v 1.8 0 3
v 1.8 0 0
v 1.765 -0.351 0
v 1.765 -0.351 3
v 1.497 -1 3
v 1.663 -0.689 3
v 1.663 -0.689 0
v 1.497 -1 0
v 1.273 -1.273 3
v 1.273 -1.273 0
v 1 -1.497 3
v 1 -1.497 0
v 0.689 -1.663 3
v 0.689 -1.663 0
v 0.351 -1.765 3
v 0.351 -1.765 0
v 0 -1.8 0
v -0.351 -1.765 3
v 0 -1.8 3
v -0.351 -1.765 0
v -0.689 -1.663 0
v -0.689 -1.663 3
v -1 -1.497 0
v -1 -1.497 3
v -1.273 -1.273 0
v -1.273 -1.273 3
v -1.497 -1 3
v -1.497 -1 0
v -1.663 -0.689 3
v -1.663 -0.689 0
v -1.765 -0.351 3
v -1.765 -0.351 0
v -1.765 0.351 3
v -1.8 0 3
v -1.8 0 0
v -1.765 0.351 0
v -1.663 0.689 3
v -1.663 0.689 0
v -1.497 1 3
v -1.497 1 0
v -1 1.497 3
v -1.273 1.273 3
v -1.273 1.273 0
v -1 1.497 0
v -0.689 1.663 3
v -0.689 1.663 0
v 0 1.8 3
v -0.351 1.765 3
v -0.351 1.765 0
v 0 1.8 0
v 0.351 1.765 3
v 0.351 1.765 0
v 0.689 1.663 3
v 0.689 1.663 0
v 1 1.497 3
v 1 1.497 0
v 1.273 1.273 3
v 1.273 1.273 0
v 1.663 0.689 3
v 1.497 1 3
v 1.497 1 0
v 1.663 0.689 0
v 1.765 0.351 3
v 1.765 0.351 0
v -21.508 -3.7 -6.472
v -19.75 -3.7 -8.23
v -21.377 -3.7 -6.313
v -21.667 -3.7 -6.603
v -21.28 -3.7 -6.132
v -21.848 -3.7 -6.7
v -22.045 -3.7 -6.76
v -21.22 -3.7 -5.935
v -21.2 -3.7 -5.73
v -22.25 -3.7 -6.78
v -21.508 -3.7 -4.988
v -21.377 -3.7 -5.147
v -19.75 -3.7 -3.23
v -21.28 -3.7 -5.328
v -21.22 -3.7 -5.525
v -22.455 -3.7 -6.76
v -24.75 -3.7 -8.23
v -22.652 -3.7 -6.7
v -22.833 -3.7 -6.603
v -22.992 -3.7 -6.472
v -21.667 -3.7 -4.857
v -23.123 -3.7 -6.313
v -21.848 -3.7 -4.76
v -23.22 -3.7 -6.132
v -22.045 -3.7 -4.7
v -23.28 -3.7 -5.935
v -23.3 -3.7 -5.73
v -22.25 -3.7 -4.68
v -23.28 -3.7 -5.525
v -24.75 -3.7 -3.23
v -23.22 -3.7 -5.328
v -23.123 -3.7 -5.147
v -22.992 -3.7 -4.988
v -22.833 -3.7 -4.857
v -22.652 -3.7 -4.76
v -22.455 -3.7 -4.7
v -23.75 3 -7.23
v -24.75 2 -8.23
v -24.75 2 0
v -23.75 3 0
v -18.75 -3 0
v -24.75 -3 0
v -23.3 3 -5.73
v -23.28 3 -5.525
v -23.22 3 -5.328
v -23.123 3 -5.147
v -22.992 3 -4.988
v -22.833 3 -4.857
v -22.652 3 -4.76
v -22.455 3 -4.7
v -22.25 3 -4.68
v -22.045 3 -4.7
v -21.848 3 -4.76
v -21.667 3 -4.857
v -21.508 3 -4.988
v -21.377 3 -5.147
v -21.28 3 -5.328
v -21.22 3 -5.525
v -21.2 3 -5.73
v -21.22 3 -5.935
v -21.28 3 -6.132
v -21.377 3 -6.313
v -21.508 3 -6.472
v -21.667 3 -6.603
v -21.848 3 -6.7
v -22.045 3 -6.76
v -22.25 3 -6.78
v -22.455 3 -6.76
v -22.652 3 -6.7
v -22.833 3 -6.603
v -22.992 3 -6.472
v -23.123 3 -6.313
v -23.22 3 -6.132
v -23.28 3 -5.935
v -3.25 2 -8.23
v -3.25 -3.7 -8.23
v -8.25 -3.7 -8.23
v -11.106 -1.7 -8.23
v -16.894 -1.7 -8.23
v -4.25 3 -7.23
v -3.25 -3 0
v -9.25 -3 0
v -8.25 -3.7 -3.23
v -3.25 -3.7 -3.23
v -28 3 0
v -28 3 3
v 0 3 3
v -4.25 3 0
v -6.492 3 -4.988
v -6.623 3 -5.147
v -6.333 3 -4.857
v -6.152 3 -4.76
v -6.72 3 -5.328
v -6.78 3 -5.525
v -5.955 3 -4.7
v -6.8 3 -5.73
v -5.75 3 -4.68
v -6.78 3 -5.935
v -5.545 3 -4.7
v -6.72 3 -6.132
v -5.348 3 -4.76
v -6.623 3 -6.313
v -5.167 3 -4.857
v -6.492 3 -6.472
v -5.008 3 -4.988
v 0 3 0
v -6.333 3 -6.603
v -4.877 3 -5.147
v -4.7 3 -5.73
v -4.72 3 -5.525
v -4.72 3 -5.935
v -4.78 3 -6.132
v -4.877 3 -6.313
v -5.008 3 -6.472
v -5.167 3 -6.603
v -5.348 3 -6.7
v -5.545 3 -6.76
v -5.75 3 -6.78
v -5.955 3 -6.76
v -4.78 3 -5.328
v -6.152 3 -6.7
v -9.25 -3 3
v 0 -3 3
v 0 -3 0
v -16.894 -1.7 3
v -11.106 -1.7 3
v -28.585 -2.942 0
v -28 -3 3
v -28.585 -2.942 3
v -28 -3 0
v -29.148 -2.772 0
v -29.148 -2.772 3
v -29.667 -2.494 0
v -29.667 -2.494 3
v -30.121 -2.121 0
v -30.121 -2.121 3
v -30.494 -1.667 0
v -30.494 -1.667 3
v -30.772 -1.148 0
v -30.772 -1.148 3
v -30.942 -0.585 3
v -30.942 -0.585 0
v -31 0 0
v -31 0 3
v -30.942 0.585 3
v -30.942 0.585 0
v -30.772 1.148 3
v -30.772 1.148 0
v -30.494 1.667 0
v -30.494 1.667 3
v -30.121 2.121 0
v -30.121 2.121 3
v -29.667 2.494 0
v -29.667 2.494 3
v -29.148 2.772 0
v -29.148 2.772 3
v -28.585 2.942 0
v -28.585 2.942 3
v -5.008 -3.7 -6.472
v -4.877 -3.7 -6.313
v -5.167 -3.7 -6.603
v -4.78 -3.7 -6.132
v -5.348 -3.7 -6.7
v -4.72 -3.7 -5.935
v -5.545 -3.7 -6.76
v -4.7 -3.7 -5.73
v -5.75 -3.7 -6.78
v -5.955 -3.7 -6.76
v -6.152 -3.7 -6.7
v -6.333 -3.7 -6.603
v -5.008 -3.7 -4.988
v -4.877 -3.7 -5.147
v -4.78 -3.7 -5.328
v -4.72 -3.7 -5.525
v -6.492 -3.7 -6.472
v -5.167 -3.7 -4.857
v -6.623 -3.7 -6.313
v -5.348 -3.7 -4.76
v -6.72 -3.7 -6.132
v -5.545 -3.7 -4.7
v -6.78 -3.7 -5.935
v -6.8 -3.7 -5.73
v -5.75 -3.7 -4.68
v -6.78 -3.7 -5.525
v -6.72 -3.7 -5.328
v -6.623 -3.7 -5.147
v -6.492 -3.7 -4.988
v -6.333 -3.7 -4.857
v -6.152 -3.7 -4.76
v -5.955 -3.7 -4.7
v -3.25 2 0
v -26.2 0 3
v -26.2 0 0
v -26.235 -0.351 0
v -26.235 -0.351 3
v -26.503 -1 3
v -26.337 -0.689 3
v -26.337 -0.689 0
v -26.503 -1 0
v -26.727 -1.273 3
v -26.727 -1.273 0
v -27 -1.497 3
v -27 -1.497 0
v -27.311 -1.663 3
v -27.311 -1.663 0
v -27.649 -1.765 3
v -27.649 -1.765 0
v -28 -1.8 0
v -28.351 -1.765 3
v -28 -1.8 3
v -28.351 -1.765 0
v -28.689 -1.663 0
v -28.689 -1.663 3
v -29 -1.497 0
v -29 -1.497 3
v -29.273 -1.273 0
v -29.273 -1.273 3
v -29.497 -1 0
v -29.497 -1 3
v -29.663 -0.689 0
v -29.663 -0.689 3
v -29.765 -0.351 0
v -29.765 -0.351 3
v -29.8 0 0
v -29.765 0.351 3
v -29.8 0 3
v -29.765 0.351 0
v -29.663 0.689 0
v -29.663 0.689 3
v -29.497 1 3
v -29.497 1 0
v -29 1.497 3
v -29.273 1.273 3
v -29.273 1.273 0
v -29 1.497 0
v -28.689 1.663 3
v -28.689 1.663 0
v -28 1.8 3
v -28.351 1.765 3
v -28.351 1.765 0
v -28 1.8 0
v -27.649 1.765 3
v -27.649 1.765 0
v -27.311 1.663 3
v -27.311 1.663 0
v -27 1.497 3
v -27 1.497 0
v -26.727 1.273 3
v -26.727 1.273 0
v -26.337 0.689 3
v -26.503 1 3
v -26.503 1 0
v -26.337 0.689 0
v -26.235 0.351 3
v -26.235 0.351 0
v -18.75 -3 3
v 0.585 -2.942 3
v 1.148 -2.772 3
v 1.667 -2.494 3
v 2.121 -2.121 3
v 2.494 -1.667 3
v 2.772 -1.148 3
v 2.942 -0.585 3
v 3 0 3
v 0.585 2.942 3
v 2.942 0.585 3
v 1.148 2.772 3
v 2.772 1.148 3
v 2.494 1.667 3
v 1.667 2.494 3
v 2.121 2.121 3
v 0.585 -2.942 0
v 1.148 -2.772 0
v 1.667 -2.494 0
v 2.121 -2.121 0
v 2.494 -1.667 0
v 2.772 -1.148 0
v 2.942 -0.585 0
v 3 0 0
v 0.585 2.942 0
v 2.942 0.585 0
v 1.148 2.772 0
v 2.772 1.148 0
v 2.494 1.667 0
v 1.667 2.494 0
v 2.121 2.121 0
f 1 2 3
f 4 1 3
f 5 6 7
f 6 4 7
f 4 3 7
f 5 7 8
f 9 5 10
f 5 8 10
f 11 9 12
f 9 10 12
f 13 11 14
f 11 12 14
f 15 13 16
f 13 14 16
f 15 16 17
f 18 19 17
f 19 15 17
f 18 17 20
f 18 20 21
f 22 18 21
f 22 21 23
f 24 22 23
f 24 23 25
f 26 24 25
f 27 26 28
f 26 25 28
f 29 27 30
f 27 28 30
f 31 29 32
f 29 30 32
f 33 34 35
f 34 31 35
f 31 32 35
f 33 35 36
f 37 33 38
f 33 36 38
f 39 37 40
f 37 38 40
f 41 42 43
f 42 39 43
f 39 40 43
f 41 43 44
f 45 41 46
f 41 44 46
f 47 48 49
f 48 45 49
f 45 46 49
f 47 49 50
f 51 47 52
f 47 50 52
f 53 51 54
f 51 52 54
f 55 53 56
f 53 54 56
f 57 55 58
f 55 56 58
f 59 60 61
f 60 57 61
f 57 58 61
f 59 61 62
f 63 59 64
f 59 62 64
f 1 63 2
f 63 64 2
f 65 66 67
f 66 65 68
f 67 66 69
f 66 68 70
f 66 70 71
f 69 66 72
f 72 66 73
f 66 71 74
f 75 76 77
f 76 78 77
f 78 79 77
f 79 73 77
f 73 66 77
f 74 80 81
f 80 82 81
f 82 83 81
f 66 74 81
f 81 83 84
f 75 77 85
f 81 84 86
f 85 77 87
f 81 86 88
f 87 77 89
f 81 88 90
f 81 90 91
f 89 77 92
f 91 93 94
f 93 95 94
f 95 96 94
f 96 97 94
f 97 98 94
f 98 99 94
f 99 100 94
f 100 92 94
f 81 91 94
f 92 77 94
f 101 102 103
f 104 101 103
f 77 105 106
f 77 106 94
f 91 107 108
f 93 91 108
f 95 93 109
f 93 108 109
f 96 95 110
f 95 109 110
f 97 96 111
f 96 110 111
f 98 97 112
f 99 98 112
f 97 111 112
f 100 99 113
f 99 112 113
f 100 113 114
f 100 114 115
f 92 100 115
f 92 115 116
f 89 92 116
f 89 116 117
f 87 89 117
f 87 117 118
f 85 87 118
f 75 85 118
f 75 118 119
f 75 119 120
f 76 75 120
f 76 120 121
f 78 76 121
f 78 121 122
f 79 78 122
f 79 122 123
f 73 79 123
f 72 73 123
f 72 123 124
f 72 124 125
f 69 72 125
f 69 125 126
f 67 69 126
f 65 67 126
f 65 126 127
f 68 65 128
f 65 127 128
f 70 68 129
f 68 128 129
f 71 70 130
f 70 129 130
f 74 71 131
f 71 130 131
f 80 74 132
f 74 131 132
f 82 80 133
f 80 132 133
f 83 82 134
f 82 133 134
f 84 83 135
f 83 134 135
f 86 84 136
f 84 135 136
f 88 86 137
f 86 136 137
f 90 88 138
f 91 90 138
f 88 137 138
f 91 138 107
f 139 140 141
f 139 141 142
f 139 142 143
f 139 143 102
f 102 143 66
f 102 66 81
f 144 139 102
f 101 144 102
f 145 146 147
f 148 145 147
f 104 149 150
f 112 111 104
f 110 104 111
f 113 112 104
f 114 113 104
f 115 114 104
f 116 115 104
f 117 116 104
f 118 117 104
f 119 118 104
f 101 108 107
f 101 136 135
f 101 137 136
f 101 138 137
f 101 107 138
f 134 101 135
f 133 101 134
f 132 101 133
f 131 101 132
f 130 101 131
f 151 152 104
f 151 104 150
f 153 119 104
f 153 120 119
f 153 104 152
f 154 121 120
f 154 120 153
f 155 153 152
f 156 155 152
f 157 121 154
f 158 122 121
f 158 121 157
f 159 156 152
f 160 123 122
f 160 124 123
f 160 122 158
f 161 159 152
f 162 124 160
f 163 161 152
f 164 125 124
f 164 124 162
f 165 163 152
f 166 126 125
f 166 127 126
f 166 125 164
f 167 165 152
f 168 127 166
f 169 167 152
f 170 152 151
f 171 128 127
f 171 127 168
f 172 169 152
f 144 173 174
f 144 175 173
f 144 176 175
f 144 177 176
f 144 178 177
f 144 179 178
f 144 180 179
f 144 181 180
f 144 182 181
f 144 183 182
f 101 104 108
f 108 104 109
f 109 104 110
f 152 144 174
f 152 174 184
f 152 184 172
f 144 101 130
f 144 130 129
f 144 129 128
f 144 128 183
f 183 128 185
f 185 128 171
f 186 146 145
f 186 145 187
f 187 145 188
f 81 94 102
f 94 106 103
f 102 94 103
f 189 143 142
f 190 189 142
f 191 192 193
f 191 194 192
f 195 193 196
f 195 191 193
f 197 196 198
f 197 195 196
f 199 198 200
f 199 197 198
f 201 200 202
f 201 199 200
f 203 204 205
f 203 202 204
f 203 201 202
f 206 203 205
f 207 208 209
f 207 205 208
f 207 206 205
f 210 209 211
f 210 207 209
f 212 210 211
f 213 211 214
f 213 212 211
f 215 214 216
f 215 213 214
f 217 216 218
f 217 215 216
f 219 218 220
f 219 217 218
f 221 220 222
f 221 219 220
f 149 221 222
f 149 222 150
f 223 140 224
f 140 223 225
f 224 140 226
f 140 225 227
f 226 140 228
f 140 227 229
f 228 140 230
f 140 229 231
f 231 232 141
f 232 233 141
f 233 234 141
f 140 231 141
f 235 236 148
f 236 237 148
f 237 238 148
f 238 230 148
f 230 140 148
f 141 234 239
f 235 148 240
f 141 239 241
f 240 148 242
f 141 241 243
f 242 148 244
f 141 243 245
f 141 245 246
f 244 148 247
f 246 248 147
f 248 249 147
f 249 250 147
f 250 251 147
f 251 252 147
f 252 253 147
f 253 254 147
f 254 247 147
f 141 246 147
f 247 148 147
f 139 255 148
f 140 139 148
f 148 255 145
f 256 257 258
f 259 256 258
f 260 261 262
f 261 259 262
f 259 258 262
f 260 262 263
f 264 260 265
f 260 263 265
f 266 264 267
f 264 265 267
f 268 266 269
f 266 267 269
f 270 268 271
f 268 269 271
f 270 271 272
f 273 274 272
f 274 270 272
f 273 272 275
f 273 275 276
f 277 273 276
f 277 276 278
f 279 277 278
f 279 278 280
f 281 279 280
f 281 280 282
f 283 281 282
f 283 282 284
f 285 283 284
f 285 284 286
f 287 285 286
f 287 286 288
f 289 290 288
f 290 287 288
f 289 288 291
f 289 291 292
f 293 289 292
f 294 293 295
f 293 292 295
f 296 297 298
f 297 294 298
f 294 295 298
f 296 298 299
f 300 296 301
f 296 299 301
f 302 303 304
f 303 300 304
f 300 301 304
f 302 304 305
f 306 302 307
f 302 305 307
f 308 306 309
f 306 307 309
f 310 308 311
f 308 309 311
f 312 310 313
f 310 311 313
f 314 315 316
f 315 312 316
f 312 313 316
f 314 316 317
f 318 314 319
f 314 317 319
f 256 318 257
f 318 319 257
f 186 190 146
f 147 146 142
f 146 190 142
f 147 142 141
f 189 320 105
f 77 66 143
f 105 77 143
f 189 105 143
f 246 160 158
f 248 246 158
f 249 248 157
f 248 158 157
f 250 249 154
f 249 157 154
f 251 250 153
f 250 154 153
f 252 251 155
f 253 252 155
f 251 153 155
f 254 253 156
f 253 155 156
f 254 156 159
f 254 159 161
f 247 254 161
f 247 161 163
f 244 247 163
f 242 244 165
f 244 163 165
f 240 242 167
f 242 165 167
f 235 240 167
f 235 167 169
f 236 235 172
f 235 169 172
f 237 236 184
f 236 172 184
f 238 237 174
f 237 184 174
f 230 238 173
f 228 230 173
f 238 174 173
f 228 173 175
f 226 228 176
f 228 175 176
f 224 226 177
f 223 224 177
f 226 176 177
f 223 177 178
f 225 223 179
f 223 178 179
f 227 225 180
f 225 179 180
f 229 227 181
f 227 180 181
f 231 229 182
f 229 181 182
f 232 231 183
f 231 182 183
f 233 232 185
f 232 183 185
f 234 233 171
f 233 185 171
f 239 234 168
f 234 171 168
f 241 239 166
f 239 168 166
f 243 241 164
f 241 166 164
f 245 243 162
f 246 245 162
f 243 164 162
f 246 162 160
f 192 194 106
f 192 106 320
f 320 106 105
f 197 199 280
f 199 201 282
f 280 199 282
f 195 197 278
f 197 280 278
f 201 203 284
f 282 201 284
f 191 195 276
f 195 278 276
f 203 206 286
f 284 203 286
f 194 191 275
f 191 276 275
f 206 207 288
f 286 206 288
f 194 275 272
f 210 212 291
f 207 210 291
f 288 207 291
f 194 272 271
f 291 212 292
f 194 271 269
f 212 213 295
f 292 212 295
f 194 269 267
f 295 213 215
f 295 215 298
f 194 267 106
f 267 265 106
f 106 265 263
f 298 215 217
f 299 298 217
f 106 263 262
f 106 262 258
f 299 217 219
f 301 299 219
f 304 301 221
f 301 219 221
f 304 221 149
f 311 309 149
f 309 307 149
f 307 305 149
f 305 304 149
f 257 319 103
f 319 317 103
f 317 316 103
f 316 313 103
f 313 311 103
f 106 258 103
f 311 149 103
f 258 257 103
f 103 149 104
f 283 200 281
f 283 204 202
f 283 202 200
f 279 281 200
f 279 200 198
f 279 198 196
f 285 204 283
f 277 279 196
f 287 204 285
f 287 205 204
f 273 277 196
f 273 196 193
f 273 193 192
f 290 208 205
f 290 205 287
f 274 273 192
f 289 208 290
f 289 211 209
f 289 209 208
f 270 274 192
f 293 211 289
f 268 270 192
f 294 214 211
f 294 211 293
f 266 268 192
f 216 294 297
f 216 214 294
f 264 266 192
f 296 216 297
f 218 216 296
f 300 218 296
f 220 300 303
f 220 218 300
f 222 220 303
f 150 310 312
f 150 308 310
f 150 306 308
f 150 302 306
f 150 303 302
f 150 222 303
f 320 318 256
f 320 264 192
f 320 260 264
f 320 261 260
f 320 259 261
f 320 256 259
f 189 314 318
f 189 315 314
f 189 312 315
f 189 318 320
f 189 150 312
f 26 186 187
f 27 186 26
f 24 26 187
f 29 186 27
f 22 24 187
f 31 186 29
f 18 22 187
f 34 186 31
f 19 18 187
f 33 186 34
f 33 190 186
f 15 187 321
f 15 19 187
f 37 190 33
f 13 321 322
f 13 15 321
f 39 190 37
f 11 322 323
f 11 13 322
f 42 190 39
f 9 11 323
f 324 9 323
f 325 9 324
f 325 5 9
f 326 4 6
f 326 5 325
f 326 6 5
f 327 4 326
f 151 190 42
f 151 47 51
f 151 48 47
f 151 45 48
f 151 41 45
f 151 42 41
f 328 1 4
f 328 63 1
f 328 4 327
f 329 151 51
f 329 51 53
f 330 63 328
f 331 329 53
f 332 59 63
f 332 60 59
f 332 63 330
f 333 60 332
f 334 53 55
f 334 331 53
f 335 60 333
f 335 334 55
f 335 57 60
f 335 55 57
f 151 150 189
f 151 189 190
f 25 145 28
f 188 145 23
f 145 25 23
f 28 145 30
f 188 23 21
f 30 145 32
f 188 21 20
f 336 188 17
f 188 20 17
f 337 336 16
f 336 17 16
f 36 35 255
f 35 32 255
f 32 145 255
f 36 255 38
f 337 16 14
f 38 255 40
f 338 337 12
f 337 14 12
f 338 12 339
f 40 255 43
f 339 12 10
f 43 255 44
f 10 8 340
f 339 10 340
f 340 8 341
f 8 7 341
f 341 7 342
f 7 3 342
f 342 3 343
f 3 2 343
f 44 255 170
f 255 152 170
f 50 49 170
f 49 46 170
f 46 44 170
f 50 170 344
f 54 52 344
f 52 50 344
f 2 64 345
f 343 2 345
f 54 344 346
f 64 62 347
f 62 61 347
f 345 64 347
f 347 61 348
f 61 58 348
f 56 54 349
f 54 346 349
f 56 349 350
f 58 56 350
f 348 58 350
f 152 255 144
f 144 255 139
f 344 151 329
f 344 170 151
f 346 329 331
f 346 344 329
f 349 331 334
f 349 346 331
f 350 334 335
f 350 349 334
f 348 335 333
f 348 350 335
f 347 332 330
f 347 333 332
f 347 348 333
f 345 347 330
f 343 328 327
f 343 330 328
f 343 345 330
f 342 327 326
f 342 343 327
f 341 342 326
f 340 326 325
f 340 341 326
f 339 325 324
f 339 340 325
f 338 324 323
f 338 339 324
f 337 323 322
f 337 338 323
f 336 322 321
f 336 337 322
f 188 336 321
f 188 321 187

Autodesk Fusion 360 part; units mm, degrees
sketch "Skizze1" plane through (0, 0, 0) normal (0, 0, 1) x (1, 0, 0)
  circle A0 centre (0, 0) radius 1.8
  circle A1 centre (-28, 0) radius 1.8
  line L0 (-28, 0) -> (0, 0) construction
  line L1 (-28, 3) -> (0, 3)
  line L2 (-28, -3) -> (0, -3)
  arc A2 (-28, 3) -> (-28, -3) centre (-28, 0) ccw
  arc A3 (0, -3) -> (0, 3) centre (0, 0) ccw
  dimension "d1" = 3.6
  dimension "d2" = 28
  dimension "d3" = 6
extrude "Extrusion1" add sketch "Skizze1" along normal blind 3
sketch "Skizze2" plane through (0, 0, 0) normal (0, 0, 1) x (-1, 0, 0)
  circle A0 centre (0, 0) radius 1.8
  circle A1 centre (28, 0) radius 1.8
  arc A2 (28, -3) -> (28, 3) centre (28, 0) ccw
  line L0 (28, 3) -> (0, 3)
  arc A3 (0, 3) -> (0, -3) centre (0, 0) ccw
  line L1 (0, -3) -> (28, -3)
  line L2 (24.75, -3) -> (3.25, -3)
  line L3 (3.25, -3) -> (3.25, 3.7)
  line L4 (3.25, 3.7) -> (24.75, 3.7)
  line L5 (24.75, 3.7) -> (24.75, -3)
  circle A4 centre (0, 0) radius 1.8
  circle A5 centre (28, 0) radius 1.8
  arc A6 (28, -3) -> (28, 3) centre (28, 0) ccw
  line L6 (28, -3) -> (0, -3)
  arc A7 (0, 3) -> (0, -3) centre (0, 0) ccw
  line L7 (0, 3) -> (28, 3)
  line L8 (28, 0) -> (0, 0) construction
  line L9 (14, 0) -> (14, 18.5057) construction
  dimension "d9" = 0.7
  dimension "d10" = 21.5
extrude "Extrusion2" add sketch "Skizze2" against normal blind 8.23 contours L0 L1 L2 L3 L5 L6 L7 | L0 L3 L4 L5 L7
sketch "Skizze3" plane through (0, 3, 0) normal (0, 1, 0) x (-1, 0, 0)
  line L0 (24.75, 0) -> (28, 0)
  line L1 (28, 0) -> (28, 3)
  line L2 (28, 3) -> (0, 3)
  line L3 (0, 3) -> (0, 0)
  line L4 (0, 0) -> (3.25, 0)
  line L5 (3.25, 0) -> (3.25, -8.23)
  line L6 (3.25, -8.23) -> (24.75, -8.23)
  line L7 (24.75, -8.23) -> (24.75, 0)
  circle A0 centre (22.25, -5.73) radius 1.05
  circle A1 centre (5.75, -5.73) radius 1.05
  line L8 (24.75, -5.73) -> (3.25, -5.73) construction
  dimension "d11" = 2.1
  dimension "d13" = 2.5
  dimension "d14" = 2.5
  dimension "d15" = 2.5
extrude "Extrusion3" cut sketch "Skizze3" against normal up to surface (6.7 mm away) contours A0 | A1
chamfer "Fase1" distance 1 angle 45 3 edges at (-24.75, 3, -4.115) (-14, 3, -8.23) (-3.25, 3, -4.115)
sketch "Skizze4" plane through (-24.75, 0, 0) normal (-1, 0, 0) x (0, -1, 0)
  line L0 (-2, 0) -> (-2, -8.23)
  line L1 (-2, -8.23) -> (3.7, -8.23)
  line L2 (3.7, -8.23) -> (3.7, 0)
  line L3 (3.7, 0) -> (3, 0)
  line L4 (3, 0) -> (-2, 0)
  line L5 (3.7, -4.68) -> (3.7, -6.78)
  line L6 (3.7, -4.68) -> (3.7, -6.78)
  line L7 (3.7, 0) -> (3.7, -8.23)
  line L8 (3.7, -8.23) -> (3.7, 0)
  line L9 (3, 0) -> (3, 3)
  line L10 (3, 3) -> (3, 0)
  line L11 (3, 0) -> (3.7, 0)
  line L12 (3.7, 0) -> (3, 0)
  line L13 (3.7, -3.23) -> (3.7, 0)
  line L14 (3, 0) -> (3.7, -3.23)
  dimension "d29" = 5
extrude "Extrusion4" cut sketch "Skizze4" against normal up to surface (21.5 mm away) contours L2 L3 L7 L8 L11 L12 L13 L14
sketch "Skizze5" plane through (0, 0, -8.23) normal (0, 0, -1) x (1, 0, 0)
  line L0 (-24.75, -2) -> (-3.25, -2)
  line L1 (-3.25, -2) -> (-3.25, 3.7)
  line L2 (-3.25, 3.7) -> (-24.75, 3.7)
  line L3 (-24.75, 3.7) -> (-24.75, -2)
  line L4 (-19.75, 3.7) -> (-16.8937, 1.7)
  line L5 (-16.8937, 1.7) -> (-11.1063, 1.7)
  line L6 (-11.1063, 1.7) -> (-8.25, 3.7)
  line L7 (-14, 3.7) -> (-14, -2) construction
  line L8 (-19.75, 3.7) -> (-8.25, 3.7)
  dimension "d22" = 5
  dimension "d24" = 2
  dimension "d25" = 35
extrude "Extrusion5" cut sketch "Skizze5" against normal up to surface (11.23 mm away) contours L2 L4 L5 L6 L8
equation "d7 = -6.73 mm - 1.5 mm"
equation "d13 = 1 mm + 1.5 mm"
equation "d14 = 1 mm + 1.5 mm"
equation "d15 = 1 mm + 1.5 mm"
equation "d22 = 1 mm + 3 mm + 1 mm"
equation "d29 = 1 mm + 3 mm + 1 mm"
